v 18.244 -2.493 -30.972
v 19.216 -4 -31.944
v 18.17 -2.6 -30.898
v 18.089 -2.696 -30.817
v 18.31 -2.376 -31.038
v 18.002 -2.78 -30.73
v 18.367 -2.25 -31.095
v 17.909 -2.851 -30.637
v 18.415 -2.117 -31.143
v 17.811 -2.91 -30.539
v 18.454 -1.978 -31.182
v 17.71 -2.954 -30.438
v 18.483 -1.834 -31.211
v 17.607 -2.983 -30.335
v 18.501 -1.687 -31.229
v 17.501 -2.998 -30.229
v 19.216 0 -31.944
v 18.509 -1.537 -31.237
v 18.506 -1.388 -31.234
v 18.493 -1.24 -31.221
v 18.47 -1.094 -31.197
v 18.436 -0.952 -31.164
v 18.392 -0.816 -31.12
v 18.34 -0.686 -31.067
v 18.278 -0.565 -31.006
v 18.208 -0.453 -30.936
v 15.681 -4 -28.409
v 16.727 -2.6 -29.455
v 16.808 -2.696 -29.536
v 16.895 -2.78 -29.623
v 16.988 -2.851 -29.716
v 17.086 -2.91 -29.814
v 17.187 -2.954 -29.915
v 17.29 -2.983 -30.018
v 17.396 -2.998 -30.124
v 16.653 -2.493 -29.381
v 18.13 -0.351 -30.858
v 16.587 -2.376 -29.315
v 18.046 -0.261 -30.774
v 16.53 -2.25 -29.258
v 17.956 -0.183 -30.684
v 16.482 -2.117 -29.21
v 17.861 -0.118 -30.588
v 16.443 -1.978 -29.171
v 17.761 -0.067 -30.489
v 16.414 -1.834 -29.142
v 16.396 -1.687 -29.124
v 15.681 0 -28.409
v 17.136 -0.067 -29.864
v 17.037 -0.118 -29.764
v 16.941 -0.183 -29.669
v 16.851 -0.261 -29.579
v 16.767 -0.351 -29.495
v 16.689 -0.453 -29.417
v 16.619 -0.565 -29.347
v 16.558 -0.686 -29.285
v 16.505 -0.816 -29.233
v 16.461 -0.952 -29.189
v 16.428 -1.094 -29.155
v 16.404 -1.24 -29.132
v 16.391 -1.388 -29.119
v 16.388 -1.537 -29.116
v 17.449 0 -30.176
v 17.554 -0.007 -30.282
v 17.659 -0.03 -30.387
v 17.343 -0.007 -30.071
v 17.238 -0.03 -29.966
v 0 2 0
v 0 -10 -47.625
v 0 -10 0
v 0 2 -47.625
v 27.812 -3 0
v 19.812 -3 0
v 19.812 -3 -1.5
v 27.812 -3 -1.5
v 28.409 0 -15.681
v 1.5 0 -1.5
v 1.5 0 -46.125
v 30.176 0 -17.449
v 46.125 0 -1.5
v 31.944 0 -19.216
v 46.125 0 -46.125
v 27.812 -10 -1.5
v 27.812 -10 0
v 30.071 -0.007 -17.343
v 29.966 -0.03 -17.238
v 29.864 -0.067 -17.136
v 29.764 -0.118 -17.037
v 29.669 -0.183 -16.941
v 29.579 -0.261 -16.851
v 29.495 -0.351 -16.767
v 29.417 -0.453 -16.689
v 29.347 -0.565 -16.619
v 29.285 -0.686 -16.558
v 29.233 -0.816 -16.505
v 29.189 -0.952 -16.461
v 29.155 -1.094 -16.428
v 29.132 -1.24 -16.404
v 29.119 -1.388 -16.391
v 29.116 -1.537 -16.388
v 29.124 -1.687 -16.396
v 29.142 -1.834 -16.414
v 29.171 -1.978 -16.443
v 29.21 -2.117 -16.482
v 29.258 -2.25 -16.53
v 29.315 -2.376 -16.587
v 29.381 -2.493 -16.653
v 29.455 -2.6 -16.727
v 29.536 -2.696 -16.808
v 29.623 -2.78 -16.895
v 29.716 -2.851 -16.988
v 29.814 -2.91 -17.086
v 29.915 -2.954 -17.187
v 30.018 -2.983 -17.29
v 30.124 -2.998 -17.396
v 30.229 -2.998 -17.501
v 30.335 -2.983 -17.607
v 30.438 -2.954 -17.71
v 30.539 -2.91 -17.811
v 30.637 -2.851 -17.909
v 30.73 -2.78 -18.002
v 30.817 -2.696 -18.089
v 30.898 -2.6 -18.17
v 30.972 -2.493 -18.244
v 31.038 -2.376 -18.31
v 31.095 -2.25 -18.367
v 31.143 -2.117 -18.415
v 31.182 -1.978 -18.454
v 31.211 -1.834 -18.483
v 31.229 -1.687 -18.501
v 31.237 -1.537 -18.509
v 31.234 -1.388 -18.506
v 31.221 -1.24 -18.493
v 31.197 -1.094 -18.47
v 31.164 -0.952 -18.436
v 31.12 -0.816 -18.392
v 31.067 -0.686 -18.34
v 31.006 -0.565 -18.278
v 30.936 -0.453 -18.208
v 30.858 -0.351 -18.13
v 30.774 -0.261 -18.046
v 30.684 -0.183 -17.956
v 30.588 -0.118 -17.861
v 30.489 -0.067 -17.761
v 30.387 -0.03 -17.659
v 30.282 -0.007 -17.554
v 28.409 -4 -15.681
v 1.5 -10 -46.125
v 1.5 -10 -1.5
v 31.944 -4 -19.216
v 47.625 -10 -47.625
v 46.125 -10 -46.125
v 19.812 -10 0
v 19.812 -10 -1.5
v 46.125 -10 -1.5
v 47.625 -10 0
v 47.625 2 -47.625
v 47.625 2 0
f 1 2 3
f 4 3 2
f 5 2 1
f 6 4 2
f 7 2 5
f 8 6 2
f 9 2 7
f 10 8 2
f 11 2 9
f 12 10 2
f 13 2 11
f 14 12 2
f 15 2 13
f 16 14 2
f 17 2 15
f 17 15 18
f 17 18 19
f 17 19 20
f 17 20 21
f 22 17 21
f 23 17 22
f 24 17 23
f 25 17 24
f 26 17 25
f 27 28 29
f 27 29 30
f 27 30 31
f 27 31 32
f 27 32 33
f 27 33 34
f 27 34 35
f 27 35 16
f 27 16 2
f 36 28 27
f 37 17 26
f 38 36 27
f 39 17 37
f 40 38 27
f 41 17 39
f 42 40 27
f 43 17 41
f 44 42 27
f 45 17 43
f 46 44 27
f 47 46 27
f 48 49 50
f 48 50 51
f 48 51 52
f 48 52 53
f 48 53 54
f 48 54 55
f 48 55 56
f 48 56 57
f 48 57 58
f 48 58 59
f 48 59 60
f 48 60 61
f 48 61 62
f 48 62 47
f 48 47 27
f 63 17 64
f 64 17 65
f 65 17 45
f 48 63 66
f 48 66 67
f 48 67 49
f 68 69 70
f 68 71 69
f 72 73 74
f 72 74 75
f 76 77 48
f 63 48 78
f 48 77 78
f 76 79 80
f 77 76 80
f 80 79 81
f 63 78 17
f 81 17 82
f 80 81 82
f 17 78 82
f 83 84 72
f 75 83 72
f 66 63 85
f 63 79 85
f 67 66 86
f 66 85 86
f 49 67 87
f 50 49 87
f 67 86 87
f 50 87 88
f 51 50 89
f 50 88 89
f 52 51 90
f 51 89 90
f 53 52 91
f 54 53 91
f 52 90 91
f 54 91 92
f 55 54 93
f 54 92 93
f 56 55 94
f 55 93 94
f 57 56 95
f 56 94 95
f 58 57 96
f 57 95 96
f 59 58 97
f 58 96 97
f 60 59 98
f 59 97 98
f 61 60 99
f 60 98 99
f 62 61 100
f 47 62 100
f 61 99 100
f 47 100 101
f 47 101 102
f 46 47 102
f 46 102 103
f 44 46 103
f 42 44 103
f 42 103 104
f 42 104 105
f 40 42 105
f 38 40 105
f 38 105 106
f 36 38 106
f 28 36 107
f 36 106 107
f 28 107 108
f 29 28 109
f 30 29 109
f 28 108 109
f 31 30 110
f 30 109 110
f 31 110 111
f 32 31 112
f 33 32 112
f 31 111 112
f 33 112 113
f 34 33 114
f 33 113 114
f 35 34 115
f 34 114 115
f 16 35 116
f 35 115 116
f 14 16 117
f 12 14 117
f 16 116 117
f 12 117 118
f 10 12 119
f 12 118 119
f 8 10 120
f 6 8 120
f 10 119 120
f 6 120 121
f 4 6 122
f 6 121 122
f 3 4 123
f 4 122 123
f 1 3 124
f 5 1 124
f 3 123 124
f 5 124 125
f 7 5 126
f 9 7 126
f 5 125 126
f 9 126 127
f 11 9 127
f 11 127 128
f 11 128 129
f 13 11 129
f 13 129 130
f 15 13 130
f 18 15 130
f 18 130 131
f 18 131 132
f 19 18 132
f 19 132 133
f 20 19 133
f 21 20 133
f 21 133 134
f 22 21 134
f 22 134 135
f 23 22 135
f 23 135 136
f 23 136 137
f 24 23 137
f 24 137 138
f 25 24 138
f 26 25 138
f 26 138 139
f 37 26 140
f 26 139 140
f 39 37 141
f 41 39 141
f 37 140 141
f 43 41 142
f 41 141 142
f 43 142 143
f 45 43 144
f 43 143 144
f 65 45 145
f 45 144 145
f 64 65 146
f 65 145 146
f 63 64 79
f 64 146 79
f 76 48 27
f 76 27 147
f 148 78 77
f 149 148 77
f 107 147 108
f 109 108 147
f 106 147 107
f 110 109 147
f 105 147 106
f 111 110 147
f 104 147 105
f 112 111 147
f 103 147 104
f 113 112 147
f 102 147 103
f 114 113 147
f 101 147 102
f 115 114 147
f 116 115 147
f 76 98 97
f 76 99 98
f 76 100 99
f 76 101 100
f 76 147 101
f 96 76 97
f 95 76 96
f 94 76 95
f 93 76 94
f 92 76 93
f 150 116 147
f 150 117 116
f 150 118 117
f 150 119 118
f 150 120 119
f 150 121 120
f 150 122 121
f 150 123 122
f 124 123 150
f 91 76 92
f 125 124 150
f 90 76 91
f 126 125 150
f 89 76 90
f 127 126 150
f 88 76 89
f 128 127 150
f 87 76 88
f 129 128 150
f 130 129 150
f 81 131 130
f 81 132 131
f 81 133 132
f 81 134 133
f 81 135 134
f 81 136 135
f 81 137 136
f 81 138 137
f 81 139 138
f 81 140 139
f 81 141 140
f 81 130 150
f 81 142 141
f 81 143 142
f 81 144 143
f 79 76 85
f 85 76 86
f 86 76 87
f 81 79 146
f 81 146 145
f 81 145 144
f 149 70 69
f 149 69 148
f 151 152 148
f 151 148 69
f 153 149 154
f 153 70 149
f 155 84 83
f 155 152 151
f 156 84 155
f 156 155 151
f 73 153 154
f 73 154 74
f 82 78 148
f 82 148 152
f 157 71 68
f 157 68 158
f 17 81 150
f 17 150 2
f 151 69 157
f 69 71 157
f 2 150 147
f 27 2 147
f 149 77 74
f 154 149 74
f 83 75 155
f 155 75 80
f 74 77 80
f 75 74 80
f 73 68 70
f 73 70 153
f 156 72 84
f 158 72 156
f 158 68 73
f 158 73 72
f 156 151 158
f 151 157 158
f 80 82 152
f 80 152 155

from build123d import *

# Parameters (mm, degrees)
SKETCH1_W           = 47.625
SKETCH1_H           = 47.625
BOSS_EXTRUDE1_DEPTH = 2
BOSS_EXTRUDE2_DEPTH = 4
SKETCH4_R           = 1.5
CUT_EXTRUDE2_DEPTH  = 69.068210275
SKETCH5_W           = 47.625
SKETCH5_H           = 47.625
SKETCH5_W_2         = 44.625
SKETCH5_H_2         = 44.625
BOSS_EXTRUDE3_DEPTH = 10
SKETCH6_W           = 8
SKETCH6_H           = 7
CUT_EXTRUDE3_DEPTH  = 2


with BuildPart() as part:
    # Sketch1 → Boss-Extrude1 (new body)
    with BuildSketch(Plane(origin=(0, 0, 0), x_dir=(1, 0, 0), z_dir=(0, 1, 0))):
        with Locations((23.8125, 23.8125)):
            Rectangle(SKETCH1_W, SKETCH1_H)
    extrude(amount=BOSS_EXTRUDE1_DEPTH)

    # Sketch2 → Boss-Extrude2 (add)
    with BuildSketch(Plane.XZ):
        Polygon((15.680772016, -28.408694078), (28.408694078, -15.680772016), (31.944227984, -19.216305922), (19.216305922, -31.944227984), align=None)
    extrude(amount=BOSS_EXTRUDE2_DEPTH)

    # Sketch4 → Cut-Extrude2 (cut, through all)
    with BuildSketch(Plane(origin=(6.363961031, 0, 6.363961031), x_dir=(0.7071067811865475, 0, -0.7071067811865477), z_dir=(0.7071067811865477, 0, 0.7071067811865475))):
        with Locations(Location((33.675960454, -1.5, 0), (0, 0, 90))):
            Circle(SKETCH4_R)
    extrude(amount=-CUT_EXTRUDE2_DEPTH, mode=Mode.SUBTRACT)

    # Sketch5 → Boss-Extrude3 (add)
    with BuildSketch(Plane.XZ):
        with Locations((23.8125, -23.8125)):
            Rectangle(SKETCH5_W, SKETCH5_H)
        with Locations((23.8125, -23.8125)):
            Rectangle(SKETCH5_W_2, SKETCH5_H_2, mode=Mode.SUBTRACT)
    extrude(amount=BOSS_EXTRUDE3_DEPTH)

    # Sketch6 → Cut-Extrude3 (cut)
    with BuildSketch(Plane.XY):
        with Locations((23.8125, -6.5)):
            Rectangle(SKETCH6_W, SKETCH6_H)
    extrude(amount=-CUT_EXTRUDE3_DEPTH, mode=Mode.SUBTRACT)


solid = part.part
